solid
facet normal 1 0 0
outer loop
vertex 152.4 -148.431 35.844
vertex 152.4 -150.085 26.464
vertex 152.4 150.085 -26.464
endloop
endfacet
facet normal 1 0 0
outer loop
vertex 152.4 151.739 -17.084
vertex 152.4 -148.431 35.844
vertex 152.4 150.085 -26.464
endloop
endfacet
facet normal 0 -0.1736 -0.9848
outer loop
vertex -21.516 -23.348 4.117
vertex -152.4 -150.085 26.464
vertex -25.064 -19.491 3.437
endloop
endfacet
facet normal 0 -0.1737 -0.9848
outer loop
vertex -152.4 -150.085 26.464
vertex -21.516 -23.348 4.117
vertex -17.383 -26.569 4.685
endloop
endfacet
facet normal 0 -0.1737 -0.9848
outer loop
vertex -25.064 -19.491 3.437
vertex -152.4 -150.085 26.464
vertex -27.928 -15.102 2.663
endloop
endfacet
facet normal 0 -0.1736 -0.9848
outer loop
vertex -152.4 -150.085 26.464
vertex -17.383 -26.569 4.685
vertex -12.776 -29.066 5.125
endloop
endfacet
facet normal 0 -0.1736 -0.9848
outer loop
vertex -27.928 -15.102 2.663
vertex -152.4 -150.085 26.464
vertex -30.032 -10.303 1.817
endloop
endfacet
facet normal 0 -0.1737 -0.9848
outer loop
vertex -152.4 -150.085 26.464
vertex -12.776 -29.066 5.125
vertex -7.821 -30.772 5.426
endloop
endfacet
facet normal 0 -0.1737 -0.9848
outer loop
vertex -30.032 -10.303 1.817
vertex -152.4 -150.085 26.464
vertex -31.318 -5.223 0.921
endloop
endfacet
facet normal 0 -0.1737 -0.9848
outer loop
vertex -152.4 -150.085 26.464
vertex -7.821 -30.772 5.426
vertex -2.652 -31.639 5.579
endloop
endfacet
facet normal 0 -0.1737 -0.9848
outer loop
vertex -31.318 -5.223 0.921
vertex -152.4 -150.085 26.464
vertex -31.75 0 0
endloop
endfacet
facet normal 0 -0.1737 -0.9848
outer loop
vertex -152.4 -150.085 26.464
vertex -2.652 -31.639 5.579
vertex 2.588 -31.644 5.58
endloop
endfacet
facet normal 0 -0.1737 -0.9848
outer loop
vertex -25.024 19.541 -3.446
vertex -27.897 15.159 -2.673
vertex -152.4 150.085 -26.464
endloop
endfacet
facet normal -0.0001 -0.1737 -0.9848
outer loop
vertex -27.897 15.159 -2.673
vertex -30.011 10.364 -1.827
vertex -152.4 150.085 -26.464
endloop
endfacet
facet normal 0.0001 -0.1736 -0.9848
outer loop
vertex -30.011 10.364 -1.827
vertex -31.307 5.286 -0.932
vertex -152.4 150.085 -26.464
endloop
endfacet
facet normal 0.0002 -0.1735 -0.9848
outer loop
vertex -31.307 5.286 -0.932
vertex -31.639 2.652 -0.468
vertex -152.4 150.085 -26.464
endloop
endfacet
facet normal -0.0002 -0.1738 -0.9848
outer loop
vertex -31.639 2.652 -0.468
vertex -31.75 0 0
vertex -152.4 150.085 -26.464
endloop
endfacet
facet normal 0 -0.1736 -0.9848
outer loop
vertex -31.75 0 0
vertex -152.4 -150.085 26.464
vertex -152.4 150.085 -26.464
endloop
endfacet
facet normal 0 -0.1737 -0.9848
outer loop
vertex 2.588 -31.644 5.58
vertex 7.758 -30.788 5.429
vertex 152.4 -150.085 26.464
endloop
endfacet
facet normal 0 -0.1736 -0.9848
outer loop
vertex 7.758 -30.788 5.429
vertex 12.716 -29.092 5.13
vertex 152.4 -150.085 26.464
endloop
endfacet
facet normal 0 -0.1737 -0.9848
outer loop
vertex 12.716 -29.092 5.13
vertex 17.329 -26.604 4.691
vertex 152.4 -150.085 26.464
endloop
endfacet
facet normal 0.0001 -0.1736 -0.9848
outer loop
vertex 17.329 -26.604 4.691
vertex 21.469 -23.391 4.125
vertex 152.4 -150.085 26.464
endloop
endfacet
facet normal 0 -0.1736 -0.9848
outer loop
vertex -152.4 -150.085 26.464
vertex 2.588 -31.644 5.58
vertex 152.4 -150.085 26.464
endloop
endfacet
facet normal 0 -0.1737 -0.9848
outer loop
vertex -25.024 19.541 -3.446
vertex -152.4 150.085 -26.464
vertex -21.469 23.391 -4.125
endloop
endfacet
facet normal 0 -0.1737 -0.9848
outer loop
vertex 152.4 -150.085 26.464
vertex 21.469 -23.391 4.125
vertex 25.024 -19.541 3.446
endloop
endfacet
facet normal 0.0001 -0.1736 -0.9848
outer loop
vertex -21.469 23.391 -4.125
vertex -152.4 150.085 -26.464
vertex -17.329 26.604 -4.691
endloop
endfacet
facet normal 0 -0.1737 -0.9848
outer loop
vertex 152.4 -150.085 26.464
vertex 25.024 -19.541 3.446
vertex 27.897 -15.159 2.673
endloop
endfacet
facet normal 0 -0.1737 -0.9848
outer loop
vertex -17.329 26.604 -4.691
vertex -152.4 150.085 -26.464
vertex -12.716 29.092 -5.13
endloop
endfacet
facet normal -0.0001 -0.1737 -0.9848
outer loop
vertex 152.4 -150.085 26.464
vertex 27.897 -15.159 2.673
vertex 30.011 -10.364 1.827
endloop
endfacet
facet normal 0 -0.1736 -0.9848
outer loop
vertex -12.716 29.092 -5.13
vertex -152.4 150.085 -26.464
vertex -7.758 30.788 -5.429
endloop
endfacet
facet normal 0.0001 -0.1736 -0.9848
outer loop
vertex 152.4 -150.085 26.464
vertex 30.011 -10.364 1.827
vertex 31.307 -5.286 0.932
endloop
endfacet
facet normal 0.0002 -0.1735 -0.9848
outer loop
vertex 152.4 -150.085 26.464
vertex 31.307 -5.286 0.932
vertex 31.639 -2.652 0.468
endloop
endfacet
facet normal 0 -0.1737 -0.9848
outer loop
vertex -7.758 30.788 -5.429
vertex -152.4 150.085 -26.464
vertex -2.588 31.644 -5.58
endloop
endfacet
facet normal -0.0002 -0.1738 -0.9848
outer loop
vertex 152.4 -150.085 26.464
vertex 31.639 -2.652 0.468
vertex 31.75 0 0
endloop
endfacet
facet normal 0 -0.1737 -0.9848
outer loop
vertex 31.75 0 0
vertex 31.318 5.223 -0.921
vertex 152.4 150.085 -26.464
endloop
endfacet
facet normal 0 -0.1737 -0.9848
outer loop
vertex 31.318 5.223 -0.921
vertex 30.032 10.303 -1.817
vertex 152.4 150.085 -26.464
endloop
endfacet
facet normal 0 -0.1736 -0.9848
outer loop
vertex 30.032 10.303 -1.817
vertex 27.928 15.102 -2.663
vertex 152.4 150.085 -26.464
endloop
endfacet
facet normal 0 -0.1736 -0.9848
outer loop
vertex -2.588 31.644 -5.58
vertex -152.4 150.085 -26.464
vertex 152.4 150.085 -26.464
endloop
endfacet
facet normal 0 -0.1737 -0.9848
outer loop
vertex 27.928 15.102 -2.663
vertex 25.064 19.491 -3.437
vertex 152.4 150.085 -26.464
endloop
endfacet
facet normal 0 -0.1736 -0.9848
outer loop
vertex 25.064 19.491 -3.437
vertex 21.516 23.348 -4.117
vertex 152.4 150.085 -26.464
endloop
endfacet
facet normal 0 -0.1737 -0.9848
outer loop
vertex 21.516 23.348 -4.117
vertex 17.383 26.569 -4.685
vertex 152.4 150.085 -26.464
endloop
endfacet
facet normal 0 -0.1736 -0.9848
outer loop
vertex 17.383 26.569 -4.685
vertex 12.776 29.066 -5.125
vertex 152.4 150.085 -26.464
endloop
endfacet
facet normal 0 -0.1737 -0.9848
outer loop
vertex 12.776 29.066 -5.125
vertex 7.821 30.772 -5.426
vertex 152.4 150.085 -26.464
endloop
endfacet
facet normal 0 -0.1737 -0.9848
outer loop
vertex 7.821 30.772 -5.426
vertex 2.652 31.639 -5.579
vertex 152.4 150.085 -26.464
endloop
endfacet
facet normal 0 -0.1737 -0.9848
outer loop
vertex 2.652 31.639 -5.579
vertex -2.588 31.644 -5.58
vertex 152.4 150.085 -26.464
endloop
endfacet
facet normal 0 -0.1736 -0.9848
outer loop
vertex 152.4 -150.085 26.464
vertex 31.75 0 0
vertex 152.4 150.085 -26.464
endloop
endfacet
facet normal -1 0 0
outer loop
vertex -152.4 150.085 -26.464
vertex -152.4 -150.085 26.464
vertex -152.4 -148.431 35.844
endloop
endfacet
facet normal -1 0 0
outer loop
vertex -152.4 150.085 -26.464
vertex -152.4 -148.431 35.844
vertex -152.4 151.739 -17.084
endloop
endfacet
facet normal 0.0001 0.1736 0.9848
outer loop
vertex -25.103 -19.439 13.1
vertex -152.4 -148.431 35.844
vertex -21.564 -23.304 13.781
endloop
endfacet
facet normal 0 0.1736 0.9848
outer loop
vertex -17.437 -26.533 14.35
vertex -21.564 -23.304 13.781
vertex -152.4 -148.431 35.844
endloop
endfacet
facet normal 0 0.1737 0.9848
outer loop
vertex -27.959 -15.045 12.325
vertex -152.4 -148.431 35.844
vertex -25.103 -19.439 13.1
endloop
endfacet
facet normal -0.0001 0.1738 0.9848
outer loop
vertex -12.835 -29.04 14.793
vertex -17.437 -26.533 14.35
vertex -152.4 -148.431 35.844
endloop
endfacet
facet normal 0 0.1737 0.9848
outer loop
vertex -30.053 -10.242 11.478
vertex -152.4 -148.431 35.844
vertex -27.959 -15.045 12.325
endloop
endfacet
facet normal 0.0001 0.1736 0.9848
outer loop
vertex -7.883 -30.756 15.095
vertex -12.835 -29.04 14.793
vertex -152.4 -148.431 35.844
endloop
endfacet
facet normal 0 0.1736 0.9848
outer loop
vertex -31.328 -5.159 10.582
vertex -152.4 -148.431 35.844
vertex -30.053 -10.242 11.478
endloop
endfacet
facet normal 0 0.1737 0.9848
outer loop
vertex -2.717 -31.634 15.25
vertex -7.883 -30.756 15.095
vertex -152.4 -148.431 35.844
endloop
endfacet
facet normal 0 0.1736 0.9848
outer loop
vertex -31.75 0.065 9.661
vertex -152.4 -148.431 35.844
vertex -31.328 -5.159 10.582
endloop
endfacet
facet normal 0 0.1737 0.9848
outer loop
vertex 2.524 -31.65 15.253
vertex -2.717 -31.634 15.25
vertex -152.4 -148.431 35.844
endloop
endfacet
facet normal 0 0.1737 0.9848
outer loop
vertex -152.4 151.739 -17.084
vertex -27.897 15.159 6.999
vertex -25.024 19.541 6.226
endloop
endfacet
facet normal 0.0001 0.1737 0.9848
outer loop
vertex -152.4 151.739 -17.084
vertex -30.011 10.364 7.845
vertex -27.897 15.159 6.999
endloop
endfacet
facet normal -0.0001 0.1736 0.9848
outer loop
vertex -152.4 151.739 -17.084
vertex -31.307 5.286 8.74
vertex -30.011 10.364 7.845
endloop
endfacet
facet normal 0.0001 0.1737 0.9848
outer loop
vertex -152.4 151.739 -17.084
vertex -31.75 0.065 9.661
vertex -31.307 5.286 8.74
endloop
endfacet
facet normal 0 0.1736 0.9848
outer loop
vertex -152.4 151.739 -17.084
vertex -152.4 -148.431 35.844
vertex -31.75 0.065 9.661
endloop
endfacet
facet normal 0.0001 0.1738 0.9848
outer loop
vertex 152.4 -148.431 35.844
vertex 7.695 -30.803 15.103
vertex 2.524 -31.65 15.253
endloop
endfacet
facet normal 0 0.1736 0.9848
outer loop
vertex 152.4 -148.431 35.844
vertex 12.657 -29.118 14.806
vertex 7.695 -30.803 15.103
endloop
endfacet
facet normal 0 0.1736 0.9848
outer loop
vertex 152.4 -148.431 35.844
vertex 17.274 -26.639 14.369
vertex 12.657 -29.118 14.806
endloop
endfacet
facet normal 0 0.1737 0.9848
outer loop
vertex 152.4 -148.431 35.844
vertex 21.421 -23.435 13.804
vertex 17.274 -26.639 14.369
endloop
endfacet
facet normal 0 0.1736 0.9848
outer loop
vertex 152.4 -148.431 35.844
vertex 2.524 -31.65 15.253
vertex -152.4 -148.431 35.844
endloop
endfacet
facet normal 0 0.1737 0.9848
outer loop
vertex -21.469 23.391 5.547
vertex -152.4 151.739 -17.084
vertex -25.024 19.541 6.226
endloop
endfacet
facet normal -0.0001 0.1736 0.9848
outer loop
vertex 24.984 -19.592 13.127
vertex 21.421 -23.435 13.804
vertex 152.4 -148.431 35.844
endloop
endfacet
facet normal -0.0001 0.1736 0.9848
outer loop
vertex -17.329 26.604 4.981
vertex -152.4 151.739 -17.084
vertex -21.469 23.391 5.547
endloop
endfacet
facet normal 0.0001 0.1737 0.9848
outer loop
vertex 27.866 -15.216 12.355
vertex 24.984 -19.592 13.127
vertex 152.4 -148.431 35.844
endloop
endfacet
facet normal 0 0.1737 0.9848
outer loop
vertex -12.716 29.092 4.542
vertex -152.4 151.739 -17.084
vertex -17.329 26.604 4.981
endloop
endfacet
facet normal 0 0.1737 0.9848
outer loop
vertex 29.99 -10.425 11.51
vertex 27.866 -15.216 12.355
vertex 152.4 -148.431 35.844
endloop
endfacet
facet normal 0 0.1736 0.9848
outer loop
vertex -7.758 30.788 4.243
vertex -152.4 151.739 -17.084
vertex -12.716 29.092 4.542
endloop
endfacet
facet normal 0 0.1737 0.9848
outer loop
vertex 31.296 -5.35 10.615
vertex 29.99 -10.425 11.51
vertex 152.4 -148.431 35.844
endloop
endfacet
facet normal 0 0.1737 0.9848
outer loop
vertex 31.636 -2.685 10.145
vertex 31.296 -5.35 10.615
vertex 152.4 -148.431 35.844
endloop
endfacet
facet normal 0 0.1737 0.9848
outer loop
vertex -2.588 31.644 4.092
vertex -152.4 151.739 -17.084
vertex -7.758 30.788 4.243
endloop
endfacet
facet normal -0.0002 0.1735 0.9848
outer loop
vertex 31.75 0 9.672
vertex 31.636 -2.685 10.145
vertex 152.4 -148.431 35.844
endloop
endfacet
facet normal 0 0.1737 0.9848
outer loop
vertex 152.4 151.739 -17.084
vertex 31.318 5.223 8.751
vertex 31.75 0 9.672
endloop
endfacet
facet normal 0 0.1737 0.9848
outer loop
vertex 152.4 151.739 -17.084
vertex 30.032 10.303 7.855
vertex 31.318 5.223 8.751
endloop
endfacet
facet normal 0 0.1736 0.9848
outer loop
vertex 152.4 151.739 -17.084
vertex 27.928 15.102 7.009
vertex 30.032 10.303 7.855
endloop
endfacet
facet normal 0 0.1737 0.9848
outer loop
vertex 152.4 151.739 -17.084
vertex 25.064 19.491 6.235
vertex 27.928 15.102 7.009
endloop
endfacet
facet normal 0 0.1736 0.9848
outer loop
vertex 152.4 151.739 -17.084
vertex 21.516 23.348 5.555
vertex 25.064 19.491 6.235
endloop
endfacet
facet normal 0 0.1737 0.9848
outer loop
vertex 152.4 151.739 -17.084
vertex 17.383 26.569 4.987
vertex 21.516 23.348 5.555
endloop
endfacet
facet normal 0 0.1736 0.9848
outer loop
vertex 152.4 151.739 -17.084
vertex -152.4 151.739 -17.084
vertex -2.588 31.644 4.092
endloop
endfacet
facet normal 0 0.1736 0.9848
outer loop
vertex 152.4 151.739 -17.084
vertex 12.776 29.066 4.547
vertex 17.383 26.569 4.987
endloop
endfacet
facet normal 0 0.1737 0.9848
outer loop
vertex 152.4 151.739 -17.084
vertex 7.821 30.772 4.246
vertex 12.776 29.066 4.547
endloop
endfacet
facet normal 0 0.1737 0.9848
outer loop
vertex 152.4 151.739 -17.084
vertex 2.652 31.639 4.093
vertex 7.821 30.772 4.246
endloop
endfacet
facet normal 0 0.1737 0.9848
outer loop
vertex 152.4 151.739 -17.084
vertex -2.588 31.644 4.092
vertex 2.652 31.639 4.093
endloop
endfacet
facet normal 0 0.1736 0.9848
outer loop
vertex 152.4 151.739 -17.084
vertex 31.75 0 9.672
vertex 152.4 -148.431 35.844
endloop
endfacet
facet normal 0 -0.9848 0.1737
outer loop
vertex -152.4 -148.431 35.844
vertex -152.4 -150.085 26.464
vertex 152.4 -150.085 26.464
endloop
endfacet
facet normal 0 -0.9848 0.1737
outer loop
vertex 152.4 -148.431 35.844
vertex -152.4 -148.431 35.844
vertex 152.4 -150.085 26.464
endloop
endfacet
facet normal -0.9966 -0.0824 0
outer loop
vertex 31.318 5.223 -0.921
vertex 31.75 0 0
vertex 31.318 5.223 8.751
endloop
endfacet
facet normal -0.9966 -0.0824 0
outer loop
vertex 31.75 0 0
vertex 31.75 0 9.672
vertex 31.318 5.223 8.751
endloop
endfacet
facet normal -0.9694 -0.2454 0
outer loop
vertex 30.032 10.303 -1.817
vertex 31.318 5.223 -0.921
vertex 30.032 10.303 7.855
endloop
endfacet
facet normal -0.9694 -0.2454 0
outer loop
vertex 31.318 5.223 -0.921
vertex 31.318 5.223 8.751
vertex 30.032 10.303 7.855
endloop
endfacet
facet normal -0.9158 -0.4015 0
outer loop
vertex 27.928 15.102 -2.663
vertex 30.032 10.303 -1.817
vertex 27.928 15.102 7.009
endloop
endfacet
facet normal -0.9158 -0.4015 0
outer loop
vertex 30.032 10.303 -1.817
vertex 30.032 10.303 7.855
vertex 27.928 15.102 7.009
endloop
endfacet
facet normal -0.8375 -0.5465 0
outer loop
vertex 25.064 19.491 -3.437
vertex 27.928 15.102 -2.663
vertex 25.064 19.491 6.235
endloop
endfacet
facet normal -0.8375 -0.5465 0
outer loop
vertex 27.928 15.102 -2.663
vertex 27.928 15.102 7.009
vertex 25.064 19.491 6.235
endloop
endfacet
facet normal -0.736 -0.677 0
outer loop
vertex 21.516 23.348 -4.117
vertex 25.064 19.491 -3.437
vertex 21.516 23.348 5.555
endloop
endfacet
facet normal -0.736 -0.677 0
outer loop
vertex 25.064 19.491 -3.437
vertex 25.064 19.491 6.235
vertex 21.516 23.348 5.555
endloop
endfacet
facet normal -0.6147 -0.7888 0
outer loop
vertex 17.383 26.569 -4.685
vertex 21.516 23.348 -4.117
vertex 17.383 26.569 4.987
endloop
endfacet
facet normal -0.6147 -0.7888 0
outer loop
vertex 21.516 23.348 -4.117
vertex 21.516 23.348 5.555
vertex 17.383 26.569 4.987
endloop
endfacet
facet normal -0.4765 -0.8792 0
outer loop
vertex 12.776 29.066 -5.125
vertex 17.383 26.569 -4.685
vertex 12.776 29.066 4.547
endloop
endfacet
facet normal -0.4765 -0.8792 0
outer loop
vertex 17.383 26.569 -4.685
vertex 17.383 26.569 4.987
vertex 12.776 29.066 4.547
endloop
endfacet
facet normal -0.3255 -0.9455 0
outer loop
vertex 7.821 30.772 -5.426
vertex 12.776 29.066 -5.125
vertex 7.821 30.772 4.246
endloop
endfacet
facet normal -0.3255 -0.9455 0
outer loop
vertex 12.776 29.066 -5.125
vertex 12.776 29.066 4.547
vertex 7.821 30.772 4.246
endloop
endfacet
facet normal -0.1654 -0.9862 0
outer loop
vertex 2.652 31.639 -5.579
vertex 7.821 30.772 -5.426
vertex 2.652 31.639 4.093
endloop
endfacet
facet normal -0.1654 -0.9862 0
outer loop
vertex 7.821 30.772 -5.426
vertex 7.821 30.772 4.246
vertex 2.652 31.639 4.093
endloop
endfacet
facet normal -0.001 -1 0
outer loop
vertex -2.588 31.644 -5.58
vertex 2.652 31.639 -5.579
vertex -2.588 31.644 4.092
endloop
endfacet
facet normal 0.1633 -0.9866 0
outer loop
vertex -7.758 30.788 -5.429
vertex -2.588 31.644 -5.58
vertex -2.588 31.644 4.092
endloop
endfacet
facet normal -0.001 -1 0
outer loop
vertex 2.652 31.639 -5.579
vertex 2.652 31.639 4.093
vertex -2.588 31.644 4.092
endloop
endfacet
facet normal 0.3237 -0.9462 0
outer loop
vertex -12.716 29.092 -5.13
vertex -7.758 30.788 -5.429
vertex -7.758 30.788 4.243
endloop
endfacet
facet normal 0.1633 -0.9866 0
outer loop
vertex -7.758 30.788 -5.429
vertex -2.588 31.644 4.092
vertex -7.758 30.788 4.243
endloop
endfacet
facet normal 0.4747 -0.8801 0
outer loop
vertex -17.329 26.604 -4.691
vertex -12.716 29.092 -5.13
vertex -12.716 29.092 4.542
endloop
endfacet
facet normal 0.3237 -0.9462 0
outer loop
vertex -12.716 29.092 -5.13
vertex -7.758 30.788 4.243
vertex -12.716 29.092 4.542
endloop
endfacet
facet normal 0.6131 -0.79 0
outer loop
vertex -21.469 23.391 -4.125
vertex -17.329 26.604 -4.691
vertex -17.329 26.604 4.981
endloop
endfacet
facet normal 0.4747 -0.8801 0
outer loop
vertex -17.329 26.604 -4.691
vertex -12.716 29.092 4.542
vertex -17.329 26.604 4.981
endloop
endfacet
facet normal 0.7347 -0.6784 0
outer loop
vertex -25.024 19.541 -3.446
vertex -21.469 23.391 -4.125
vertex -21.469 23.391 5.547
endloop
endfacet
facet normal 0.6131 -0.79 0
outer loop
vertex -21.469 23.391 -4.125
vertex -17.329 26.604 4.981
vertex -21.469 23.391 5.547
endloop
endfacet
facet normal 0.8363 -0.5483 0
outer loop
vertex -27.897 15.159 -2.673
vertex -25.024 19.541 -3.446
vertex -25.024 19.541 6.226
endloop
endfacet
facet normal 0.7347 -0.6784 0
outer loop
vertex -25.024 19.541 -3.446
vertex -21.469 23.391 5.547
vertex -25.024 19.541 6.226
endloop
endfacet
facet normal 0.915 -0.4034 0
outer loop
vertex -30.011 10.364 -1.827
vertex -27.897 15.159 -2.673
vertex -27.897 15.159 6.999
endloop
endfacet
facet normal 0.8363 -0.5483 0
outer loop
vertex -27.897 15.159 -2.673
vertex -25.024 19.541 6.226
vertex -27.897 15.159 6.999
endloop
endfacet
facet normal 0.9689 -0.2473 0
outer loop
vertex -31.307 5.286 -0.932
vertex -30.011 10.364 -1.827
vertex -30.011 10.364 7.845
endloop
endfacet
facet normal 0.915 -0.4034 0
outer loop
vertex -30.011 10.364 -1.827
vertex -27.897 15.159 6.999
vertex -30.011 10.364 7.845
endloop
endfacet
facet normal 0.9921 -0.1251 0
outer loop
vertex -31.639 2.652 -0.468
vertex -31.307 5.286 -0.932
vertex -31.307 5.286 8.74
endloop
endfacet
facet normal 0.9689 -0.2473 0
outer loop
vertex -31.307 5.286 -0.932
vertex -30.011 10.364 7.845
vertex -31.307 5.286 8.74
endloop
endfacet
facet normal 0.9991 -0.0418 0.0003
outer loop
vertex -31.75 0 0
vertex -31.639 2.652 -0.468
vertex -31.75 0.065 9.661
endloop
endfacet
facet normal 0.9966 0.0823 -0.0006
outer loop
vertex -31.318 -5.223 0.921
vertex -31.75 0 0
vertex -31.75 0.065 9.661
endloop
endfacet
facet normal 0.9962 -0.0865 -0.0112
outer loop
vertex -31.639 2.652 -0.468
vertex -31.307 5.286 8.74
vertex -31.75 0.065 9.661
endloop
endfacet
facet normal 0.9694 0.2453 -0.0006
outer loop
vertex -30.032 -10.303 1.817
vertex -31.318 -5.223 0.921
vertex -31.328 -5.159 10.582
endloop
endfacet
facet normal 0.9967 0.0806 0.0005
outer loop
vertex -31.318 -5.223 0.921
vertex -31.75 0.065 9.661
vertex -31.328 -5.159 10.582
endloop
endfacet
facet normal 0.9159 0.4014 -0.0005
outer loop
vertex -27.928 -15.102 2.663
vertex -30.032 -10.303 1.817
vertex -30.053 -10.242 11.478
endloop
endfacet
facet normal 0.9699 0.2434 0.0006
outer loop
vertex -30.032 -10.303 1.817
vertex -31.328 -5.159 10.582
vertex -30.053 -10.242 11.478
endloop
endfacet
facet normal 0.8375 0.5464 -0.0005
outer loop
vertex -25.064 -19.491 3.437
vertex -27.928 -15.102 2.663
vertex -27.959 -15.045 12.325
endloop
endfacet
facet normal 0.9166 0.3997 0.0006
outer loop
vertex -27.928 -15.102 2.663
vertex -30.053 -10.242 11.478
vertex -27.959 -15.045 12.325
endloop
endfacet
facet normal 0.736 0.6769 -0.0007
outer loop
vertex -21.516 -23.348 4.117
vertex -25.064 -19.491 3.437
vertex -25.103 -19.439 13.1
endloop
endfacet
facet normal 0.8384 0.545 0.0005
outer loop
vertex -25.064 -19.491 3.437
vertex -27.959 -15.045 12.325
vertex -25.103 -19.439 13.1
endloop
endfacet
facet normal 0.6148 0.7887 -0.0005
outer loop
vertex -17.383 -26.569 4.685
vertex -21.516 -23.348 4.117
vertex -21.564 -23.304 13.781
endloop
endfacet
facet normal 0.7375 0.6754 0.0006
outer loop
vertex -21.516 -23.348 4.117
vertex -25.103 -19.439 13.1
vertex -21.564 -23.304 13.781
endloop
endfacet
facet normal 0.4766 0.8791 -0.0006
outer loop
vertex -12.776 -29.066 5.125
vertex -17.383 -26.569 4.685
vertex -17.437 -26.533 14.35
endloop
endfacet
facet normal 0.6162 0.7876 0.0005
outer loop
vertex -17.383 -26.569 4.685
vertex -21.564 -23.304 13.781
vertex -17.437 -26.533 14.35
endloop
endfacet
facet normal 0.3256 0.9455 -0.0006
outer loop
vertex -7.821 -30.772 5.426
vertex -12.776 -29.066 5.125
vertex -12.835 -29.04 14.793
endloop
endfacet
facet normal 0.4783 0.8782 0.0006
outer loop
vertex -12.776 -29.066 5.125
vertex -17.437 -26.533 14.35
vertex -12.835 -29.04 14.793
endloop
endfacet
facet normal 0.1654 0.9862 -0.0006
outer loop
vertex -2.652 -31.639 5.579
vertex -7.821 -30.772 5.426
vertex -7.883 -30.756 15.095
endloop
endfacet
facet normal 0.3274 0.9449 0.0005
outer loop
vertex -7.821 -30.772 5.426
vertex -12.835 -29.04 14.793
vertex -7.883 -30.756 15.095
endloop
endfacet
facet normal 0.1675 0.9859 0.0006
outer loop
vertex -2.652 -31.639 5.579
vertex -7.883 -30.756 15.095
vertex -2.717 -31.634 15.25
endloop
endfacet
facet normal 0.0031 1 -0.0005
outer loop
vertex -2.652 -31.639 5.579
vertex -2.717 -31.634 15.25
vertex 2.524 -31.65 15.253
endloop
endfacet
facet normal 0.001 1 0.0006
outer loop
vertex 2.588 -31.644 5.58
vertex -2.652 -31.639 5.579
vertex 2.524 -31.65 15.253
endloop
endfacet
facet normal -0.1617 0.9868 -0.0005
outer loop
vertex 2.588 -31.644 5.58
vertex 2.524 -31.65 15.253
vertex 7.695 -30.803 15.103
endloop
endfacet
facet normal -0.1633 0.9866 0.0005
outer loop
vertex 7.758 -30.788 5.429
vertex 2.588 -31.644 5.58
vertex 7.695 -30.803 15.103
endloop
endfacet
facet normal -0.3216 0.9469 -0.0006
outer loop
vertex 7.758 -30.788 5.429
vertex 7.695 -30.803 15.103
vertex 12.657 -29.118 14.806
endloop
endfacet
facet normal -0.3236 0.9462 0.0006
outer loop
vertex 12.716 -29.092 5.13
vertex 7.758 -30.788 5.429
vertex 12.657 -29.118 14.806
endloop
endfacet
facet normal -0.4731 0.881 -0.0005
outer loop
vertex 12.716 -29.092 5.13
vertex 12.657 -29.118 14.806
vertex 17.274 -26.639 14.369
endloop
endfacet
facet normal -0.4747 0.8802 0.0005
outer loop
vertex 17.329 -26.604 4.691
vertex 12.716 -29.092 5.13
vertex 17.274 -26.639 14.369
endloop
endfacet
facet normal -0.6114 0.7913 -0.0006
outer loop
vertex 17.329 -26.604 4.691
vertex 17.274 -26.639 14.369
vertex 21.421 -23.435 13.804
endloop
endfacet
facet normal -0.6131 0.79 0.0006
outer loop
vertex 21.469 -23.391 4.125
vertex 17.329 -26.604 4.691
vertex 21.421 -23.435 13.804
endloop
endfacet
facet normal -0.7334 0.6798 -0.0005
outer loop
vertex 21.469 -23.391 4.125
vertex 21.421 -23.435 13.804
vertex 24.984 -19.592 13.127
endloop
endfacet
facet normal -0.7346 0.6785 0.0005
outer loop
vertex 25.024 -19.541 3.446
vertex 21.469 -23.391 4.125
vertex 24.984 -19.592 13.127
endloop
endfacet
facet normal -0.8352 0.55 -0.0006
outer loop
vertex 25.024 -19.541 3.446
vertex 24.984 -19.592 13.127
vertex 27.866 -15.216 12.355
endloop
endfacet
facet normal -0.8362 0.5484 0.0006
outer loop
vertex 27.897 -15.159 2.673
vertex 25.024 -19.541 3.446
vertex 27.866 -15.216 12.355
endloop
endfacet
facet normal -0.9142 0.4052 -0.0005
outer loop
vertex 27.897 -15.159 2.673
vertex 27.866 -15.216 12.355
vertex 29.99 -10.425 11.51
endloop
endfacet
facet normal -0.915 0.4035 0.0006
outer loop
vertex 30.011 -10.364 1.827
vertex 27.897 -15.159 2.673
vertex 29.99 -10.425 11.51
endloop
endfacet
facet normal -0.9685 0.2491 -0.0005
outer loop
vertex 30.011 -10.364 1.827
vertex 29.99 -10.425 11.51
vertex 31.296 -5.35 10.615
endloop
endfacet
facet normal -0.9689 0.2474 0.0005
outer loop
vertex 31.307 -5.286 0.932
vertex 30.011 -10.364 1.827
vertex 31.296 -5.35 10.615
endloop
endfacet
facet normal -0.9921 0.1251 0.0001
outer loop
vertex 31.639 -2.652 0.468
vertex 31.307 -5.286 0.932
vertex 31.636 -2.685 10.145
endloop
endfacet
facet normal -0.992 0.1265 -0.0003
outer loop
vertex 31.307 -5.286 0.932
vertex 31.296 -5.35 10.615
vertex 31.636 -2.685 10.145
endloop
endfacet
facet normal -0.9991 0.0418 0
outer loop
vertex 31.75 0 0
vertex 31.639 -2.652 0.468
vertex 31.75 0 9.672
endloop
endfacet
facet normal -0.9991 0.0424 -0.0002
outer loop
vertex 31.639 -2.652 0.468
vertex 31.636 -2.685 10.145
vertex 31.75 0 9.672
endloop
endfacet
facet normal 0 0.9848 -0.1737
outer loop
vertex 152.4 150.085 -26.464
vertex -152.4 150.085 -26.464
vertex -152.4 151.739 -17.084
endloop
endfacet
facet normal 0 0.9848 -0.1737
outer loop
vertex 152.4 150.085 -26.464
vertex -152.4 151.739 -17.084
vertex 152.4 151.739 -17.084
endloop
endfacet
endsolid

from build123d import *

# Parameters (mm, degrees)
F2_W          = 304.8
F2_H          = 304.8
F3_DEPTH      = 9.525
F4_R          = 31.75
F5_DEPTH      = 25.4
F5_DEPTH_BACK = 25.4


with BuildPart() as f3:
    # F2 (on line) → F3 (new body)
    with BuildSketch(Plane(origin=(0, 0, 0), x_dir=(1, 0, 0), z_dir=(0, 0.1736481777, 0.984807753))):
        Rectangle(F2_W, F2_H)
    extrude(amount=F3_DEPTH)

    # F4 (on Top) → F5 (cut, two sides)
    with BuildSketch(Plane.XY) as f5_sk:
        Circle(F4_R)
    extrude(amount=-F5_DEPTH, mode=Mode.SUBTRACT)
    extrude(f5_sk.sketch, amount=F5_DEPTH_BACK, mode=Mode.SUBTRACT)


solid = f3.part
